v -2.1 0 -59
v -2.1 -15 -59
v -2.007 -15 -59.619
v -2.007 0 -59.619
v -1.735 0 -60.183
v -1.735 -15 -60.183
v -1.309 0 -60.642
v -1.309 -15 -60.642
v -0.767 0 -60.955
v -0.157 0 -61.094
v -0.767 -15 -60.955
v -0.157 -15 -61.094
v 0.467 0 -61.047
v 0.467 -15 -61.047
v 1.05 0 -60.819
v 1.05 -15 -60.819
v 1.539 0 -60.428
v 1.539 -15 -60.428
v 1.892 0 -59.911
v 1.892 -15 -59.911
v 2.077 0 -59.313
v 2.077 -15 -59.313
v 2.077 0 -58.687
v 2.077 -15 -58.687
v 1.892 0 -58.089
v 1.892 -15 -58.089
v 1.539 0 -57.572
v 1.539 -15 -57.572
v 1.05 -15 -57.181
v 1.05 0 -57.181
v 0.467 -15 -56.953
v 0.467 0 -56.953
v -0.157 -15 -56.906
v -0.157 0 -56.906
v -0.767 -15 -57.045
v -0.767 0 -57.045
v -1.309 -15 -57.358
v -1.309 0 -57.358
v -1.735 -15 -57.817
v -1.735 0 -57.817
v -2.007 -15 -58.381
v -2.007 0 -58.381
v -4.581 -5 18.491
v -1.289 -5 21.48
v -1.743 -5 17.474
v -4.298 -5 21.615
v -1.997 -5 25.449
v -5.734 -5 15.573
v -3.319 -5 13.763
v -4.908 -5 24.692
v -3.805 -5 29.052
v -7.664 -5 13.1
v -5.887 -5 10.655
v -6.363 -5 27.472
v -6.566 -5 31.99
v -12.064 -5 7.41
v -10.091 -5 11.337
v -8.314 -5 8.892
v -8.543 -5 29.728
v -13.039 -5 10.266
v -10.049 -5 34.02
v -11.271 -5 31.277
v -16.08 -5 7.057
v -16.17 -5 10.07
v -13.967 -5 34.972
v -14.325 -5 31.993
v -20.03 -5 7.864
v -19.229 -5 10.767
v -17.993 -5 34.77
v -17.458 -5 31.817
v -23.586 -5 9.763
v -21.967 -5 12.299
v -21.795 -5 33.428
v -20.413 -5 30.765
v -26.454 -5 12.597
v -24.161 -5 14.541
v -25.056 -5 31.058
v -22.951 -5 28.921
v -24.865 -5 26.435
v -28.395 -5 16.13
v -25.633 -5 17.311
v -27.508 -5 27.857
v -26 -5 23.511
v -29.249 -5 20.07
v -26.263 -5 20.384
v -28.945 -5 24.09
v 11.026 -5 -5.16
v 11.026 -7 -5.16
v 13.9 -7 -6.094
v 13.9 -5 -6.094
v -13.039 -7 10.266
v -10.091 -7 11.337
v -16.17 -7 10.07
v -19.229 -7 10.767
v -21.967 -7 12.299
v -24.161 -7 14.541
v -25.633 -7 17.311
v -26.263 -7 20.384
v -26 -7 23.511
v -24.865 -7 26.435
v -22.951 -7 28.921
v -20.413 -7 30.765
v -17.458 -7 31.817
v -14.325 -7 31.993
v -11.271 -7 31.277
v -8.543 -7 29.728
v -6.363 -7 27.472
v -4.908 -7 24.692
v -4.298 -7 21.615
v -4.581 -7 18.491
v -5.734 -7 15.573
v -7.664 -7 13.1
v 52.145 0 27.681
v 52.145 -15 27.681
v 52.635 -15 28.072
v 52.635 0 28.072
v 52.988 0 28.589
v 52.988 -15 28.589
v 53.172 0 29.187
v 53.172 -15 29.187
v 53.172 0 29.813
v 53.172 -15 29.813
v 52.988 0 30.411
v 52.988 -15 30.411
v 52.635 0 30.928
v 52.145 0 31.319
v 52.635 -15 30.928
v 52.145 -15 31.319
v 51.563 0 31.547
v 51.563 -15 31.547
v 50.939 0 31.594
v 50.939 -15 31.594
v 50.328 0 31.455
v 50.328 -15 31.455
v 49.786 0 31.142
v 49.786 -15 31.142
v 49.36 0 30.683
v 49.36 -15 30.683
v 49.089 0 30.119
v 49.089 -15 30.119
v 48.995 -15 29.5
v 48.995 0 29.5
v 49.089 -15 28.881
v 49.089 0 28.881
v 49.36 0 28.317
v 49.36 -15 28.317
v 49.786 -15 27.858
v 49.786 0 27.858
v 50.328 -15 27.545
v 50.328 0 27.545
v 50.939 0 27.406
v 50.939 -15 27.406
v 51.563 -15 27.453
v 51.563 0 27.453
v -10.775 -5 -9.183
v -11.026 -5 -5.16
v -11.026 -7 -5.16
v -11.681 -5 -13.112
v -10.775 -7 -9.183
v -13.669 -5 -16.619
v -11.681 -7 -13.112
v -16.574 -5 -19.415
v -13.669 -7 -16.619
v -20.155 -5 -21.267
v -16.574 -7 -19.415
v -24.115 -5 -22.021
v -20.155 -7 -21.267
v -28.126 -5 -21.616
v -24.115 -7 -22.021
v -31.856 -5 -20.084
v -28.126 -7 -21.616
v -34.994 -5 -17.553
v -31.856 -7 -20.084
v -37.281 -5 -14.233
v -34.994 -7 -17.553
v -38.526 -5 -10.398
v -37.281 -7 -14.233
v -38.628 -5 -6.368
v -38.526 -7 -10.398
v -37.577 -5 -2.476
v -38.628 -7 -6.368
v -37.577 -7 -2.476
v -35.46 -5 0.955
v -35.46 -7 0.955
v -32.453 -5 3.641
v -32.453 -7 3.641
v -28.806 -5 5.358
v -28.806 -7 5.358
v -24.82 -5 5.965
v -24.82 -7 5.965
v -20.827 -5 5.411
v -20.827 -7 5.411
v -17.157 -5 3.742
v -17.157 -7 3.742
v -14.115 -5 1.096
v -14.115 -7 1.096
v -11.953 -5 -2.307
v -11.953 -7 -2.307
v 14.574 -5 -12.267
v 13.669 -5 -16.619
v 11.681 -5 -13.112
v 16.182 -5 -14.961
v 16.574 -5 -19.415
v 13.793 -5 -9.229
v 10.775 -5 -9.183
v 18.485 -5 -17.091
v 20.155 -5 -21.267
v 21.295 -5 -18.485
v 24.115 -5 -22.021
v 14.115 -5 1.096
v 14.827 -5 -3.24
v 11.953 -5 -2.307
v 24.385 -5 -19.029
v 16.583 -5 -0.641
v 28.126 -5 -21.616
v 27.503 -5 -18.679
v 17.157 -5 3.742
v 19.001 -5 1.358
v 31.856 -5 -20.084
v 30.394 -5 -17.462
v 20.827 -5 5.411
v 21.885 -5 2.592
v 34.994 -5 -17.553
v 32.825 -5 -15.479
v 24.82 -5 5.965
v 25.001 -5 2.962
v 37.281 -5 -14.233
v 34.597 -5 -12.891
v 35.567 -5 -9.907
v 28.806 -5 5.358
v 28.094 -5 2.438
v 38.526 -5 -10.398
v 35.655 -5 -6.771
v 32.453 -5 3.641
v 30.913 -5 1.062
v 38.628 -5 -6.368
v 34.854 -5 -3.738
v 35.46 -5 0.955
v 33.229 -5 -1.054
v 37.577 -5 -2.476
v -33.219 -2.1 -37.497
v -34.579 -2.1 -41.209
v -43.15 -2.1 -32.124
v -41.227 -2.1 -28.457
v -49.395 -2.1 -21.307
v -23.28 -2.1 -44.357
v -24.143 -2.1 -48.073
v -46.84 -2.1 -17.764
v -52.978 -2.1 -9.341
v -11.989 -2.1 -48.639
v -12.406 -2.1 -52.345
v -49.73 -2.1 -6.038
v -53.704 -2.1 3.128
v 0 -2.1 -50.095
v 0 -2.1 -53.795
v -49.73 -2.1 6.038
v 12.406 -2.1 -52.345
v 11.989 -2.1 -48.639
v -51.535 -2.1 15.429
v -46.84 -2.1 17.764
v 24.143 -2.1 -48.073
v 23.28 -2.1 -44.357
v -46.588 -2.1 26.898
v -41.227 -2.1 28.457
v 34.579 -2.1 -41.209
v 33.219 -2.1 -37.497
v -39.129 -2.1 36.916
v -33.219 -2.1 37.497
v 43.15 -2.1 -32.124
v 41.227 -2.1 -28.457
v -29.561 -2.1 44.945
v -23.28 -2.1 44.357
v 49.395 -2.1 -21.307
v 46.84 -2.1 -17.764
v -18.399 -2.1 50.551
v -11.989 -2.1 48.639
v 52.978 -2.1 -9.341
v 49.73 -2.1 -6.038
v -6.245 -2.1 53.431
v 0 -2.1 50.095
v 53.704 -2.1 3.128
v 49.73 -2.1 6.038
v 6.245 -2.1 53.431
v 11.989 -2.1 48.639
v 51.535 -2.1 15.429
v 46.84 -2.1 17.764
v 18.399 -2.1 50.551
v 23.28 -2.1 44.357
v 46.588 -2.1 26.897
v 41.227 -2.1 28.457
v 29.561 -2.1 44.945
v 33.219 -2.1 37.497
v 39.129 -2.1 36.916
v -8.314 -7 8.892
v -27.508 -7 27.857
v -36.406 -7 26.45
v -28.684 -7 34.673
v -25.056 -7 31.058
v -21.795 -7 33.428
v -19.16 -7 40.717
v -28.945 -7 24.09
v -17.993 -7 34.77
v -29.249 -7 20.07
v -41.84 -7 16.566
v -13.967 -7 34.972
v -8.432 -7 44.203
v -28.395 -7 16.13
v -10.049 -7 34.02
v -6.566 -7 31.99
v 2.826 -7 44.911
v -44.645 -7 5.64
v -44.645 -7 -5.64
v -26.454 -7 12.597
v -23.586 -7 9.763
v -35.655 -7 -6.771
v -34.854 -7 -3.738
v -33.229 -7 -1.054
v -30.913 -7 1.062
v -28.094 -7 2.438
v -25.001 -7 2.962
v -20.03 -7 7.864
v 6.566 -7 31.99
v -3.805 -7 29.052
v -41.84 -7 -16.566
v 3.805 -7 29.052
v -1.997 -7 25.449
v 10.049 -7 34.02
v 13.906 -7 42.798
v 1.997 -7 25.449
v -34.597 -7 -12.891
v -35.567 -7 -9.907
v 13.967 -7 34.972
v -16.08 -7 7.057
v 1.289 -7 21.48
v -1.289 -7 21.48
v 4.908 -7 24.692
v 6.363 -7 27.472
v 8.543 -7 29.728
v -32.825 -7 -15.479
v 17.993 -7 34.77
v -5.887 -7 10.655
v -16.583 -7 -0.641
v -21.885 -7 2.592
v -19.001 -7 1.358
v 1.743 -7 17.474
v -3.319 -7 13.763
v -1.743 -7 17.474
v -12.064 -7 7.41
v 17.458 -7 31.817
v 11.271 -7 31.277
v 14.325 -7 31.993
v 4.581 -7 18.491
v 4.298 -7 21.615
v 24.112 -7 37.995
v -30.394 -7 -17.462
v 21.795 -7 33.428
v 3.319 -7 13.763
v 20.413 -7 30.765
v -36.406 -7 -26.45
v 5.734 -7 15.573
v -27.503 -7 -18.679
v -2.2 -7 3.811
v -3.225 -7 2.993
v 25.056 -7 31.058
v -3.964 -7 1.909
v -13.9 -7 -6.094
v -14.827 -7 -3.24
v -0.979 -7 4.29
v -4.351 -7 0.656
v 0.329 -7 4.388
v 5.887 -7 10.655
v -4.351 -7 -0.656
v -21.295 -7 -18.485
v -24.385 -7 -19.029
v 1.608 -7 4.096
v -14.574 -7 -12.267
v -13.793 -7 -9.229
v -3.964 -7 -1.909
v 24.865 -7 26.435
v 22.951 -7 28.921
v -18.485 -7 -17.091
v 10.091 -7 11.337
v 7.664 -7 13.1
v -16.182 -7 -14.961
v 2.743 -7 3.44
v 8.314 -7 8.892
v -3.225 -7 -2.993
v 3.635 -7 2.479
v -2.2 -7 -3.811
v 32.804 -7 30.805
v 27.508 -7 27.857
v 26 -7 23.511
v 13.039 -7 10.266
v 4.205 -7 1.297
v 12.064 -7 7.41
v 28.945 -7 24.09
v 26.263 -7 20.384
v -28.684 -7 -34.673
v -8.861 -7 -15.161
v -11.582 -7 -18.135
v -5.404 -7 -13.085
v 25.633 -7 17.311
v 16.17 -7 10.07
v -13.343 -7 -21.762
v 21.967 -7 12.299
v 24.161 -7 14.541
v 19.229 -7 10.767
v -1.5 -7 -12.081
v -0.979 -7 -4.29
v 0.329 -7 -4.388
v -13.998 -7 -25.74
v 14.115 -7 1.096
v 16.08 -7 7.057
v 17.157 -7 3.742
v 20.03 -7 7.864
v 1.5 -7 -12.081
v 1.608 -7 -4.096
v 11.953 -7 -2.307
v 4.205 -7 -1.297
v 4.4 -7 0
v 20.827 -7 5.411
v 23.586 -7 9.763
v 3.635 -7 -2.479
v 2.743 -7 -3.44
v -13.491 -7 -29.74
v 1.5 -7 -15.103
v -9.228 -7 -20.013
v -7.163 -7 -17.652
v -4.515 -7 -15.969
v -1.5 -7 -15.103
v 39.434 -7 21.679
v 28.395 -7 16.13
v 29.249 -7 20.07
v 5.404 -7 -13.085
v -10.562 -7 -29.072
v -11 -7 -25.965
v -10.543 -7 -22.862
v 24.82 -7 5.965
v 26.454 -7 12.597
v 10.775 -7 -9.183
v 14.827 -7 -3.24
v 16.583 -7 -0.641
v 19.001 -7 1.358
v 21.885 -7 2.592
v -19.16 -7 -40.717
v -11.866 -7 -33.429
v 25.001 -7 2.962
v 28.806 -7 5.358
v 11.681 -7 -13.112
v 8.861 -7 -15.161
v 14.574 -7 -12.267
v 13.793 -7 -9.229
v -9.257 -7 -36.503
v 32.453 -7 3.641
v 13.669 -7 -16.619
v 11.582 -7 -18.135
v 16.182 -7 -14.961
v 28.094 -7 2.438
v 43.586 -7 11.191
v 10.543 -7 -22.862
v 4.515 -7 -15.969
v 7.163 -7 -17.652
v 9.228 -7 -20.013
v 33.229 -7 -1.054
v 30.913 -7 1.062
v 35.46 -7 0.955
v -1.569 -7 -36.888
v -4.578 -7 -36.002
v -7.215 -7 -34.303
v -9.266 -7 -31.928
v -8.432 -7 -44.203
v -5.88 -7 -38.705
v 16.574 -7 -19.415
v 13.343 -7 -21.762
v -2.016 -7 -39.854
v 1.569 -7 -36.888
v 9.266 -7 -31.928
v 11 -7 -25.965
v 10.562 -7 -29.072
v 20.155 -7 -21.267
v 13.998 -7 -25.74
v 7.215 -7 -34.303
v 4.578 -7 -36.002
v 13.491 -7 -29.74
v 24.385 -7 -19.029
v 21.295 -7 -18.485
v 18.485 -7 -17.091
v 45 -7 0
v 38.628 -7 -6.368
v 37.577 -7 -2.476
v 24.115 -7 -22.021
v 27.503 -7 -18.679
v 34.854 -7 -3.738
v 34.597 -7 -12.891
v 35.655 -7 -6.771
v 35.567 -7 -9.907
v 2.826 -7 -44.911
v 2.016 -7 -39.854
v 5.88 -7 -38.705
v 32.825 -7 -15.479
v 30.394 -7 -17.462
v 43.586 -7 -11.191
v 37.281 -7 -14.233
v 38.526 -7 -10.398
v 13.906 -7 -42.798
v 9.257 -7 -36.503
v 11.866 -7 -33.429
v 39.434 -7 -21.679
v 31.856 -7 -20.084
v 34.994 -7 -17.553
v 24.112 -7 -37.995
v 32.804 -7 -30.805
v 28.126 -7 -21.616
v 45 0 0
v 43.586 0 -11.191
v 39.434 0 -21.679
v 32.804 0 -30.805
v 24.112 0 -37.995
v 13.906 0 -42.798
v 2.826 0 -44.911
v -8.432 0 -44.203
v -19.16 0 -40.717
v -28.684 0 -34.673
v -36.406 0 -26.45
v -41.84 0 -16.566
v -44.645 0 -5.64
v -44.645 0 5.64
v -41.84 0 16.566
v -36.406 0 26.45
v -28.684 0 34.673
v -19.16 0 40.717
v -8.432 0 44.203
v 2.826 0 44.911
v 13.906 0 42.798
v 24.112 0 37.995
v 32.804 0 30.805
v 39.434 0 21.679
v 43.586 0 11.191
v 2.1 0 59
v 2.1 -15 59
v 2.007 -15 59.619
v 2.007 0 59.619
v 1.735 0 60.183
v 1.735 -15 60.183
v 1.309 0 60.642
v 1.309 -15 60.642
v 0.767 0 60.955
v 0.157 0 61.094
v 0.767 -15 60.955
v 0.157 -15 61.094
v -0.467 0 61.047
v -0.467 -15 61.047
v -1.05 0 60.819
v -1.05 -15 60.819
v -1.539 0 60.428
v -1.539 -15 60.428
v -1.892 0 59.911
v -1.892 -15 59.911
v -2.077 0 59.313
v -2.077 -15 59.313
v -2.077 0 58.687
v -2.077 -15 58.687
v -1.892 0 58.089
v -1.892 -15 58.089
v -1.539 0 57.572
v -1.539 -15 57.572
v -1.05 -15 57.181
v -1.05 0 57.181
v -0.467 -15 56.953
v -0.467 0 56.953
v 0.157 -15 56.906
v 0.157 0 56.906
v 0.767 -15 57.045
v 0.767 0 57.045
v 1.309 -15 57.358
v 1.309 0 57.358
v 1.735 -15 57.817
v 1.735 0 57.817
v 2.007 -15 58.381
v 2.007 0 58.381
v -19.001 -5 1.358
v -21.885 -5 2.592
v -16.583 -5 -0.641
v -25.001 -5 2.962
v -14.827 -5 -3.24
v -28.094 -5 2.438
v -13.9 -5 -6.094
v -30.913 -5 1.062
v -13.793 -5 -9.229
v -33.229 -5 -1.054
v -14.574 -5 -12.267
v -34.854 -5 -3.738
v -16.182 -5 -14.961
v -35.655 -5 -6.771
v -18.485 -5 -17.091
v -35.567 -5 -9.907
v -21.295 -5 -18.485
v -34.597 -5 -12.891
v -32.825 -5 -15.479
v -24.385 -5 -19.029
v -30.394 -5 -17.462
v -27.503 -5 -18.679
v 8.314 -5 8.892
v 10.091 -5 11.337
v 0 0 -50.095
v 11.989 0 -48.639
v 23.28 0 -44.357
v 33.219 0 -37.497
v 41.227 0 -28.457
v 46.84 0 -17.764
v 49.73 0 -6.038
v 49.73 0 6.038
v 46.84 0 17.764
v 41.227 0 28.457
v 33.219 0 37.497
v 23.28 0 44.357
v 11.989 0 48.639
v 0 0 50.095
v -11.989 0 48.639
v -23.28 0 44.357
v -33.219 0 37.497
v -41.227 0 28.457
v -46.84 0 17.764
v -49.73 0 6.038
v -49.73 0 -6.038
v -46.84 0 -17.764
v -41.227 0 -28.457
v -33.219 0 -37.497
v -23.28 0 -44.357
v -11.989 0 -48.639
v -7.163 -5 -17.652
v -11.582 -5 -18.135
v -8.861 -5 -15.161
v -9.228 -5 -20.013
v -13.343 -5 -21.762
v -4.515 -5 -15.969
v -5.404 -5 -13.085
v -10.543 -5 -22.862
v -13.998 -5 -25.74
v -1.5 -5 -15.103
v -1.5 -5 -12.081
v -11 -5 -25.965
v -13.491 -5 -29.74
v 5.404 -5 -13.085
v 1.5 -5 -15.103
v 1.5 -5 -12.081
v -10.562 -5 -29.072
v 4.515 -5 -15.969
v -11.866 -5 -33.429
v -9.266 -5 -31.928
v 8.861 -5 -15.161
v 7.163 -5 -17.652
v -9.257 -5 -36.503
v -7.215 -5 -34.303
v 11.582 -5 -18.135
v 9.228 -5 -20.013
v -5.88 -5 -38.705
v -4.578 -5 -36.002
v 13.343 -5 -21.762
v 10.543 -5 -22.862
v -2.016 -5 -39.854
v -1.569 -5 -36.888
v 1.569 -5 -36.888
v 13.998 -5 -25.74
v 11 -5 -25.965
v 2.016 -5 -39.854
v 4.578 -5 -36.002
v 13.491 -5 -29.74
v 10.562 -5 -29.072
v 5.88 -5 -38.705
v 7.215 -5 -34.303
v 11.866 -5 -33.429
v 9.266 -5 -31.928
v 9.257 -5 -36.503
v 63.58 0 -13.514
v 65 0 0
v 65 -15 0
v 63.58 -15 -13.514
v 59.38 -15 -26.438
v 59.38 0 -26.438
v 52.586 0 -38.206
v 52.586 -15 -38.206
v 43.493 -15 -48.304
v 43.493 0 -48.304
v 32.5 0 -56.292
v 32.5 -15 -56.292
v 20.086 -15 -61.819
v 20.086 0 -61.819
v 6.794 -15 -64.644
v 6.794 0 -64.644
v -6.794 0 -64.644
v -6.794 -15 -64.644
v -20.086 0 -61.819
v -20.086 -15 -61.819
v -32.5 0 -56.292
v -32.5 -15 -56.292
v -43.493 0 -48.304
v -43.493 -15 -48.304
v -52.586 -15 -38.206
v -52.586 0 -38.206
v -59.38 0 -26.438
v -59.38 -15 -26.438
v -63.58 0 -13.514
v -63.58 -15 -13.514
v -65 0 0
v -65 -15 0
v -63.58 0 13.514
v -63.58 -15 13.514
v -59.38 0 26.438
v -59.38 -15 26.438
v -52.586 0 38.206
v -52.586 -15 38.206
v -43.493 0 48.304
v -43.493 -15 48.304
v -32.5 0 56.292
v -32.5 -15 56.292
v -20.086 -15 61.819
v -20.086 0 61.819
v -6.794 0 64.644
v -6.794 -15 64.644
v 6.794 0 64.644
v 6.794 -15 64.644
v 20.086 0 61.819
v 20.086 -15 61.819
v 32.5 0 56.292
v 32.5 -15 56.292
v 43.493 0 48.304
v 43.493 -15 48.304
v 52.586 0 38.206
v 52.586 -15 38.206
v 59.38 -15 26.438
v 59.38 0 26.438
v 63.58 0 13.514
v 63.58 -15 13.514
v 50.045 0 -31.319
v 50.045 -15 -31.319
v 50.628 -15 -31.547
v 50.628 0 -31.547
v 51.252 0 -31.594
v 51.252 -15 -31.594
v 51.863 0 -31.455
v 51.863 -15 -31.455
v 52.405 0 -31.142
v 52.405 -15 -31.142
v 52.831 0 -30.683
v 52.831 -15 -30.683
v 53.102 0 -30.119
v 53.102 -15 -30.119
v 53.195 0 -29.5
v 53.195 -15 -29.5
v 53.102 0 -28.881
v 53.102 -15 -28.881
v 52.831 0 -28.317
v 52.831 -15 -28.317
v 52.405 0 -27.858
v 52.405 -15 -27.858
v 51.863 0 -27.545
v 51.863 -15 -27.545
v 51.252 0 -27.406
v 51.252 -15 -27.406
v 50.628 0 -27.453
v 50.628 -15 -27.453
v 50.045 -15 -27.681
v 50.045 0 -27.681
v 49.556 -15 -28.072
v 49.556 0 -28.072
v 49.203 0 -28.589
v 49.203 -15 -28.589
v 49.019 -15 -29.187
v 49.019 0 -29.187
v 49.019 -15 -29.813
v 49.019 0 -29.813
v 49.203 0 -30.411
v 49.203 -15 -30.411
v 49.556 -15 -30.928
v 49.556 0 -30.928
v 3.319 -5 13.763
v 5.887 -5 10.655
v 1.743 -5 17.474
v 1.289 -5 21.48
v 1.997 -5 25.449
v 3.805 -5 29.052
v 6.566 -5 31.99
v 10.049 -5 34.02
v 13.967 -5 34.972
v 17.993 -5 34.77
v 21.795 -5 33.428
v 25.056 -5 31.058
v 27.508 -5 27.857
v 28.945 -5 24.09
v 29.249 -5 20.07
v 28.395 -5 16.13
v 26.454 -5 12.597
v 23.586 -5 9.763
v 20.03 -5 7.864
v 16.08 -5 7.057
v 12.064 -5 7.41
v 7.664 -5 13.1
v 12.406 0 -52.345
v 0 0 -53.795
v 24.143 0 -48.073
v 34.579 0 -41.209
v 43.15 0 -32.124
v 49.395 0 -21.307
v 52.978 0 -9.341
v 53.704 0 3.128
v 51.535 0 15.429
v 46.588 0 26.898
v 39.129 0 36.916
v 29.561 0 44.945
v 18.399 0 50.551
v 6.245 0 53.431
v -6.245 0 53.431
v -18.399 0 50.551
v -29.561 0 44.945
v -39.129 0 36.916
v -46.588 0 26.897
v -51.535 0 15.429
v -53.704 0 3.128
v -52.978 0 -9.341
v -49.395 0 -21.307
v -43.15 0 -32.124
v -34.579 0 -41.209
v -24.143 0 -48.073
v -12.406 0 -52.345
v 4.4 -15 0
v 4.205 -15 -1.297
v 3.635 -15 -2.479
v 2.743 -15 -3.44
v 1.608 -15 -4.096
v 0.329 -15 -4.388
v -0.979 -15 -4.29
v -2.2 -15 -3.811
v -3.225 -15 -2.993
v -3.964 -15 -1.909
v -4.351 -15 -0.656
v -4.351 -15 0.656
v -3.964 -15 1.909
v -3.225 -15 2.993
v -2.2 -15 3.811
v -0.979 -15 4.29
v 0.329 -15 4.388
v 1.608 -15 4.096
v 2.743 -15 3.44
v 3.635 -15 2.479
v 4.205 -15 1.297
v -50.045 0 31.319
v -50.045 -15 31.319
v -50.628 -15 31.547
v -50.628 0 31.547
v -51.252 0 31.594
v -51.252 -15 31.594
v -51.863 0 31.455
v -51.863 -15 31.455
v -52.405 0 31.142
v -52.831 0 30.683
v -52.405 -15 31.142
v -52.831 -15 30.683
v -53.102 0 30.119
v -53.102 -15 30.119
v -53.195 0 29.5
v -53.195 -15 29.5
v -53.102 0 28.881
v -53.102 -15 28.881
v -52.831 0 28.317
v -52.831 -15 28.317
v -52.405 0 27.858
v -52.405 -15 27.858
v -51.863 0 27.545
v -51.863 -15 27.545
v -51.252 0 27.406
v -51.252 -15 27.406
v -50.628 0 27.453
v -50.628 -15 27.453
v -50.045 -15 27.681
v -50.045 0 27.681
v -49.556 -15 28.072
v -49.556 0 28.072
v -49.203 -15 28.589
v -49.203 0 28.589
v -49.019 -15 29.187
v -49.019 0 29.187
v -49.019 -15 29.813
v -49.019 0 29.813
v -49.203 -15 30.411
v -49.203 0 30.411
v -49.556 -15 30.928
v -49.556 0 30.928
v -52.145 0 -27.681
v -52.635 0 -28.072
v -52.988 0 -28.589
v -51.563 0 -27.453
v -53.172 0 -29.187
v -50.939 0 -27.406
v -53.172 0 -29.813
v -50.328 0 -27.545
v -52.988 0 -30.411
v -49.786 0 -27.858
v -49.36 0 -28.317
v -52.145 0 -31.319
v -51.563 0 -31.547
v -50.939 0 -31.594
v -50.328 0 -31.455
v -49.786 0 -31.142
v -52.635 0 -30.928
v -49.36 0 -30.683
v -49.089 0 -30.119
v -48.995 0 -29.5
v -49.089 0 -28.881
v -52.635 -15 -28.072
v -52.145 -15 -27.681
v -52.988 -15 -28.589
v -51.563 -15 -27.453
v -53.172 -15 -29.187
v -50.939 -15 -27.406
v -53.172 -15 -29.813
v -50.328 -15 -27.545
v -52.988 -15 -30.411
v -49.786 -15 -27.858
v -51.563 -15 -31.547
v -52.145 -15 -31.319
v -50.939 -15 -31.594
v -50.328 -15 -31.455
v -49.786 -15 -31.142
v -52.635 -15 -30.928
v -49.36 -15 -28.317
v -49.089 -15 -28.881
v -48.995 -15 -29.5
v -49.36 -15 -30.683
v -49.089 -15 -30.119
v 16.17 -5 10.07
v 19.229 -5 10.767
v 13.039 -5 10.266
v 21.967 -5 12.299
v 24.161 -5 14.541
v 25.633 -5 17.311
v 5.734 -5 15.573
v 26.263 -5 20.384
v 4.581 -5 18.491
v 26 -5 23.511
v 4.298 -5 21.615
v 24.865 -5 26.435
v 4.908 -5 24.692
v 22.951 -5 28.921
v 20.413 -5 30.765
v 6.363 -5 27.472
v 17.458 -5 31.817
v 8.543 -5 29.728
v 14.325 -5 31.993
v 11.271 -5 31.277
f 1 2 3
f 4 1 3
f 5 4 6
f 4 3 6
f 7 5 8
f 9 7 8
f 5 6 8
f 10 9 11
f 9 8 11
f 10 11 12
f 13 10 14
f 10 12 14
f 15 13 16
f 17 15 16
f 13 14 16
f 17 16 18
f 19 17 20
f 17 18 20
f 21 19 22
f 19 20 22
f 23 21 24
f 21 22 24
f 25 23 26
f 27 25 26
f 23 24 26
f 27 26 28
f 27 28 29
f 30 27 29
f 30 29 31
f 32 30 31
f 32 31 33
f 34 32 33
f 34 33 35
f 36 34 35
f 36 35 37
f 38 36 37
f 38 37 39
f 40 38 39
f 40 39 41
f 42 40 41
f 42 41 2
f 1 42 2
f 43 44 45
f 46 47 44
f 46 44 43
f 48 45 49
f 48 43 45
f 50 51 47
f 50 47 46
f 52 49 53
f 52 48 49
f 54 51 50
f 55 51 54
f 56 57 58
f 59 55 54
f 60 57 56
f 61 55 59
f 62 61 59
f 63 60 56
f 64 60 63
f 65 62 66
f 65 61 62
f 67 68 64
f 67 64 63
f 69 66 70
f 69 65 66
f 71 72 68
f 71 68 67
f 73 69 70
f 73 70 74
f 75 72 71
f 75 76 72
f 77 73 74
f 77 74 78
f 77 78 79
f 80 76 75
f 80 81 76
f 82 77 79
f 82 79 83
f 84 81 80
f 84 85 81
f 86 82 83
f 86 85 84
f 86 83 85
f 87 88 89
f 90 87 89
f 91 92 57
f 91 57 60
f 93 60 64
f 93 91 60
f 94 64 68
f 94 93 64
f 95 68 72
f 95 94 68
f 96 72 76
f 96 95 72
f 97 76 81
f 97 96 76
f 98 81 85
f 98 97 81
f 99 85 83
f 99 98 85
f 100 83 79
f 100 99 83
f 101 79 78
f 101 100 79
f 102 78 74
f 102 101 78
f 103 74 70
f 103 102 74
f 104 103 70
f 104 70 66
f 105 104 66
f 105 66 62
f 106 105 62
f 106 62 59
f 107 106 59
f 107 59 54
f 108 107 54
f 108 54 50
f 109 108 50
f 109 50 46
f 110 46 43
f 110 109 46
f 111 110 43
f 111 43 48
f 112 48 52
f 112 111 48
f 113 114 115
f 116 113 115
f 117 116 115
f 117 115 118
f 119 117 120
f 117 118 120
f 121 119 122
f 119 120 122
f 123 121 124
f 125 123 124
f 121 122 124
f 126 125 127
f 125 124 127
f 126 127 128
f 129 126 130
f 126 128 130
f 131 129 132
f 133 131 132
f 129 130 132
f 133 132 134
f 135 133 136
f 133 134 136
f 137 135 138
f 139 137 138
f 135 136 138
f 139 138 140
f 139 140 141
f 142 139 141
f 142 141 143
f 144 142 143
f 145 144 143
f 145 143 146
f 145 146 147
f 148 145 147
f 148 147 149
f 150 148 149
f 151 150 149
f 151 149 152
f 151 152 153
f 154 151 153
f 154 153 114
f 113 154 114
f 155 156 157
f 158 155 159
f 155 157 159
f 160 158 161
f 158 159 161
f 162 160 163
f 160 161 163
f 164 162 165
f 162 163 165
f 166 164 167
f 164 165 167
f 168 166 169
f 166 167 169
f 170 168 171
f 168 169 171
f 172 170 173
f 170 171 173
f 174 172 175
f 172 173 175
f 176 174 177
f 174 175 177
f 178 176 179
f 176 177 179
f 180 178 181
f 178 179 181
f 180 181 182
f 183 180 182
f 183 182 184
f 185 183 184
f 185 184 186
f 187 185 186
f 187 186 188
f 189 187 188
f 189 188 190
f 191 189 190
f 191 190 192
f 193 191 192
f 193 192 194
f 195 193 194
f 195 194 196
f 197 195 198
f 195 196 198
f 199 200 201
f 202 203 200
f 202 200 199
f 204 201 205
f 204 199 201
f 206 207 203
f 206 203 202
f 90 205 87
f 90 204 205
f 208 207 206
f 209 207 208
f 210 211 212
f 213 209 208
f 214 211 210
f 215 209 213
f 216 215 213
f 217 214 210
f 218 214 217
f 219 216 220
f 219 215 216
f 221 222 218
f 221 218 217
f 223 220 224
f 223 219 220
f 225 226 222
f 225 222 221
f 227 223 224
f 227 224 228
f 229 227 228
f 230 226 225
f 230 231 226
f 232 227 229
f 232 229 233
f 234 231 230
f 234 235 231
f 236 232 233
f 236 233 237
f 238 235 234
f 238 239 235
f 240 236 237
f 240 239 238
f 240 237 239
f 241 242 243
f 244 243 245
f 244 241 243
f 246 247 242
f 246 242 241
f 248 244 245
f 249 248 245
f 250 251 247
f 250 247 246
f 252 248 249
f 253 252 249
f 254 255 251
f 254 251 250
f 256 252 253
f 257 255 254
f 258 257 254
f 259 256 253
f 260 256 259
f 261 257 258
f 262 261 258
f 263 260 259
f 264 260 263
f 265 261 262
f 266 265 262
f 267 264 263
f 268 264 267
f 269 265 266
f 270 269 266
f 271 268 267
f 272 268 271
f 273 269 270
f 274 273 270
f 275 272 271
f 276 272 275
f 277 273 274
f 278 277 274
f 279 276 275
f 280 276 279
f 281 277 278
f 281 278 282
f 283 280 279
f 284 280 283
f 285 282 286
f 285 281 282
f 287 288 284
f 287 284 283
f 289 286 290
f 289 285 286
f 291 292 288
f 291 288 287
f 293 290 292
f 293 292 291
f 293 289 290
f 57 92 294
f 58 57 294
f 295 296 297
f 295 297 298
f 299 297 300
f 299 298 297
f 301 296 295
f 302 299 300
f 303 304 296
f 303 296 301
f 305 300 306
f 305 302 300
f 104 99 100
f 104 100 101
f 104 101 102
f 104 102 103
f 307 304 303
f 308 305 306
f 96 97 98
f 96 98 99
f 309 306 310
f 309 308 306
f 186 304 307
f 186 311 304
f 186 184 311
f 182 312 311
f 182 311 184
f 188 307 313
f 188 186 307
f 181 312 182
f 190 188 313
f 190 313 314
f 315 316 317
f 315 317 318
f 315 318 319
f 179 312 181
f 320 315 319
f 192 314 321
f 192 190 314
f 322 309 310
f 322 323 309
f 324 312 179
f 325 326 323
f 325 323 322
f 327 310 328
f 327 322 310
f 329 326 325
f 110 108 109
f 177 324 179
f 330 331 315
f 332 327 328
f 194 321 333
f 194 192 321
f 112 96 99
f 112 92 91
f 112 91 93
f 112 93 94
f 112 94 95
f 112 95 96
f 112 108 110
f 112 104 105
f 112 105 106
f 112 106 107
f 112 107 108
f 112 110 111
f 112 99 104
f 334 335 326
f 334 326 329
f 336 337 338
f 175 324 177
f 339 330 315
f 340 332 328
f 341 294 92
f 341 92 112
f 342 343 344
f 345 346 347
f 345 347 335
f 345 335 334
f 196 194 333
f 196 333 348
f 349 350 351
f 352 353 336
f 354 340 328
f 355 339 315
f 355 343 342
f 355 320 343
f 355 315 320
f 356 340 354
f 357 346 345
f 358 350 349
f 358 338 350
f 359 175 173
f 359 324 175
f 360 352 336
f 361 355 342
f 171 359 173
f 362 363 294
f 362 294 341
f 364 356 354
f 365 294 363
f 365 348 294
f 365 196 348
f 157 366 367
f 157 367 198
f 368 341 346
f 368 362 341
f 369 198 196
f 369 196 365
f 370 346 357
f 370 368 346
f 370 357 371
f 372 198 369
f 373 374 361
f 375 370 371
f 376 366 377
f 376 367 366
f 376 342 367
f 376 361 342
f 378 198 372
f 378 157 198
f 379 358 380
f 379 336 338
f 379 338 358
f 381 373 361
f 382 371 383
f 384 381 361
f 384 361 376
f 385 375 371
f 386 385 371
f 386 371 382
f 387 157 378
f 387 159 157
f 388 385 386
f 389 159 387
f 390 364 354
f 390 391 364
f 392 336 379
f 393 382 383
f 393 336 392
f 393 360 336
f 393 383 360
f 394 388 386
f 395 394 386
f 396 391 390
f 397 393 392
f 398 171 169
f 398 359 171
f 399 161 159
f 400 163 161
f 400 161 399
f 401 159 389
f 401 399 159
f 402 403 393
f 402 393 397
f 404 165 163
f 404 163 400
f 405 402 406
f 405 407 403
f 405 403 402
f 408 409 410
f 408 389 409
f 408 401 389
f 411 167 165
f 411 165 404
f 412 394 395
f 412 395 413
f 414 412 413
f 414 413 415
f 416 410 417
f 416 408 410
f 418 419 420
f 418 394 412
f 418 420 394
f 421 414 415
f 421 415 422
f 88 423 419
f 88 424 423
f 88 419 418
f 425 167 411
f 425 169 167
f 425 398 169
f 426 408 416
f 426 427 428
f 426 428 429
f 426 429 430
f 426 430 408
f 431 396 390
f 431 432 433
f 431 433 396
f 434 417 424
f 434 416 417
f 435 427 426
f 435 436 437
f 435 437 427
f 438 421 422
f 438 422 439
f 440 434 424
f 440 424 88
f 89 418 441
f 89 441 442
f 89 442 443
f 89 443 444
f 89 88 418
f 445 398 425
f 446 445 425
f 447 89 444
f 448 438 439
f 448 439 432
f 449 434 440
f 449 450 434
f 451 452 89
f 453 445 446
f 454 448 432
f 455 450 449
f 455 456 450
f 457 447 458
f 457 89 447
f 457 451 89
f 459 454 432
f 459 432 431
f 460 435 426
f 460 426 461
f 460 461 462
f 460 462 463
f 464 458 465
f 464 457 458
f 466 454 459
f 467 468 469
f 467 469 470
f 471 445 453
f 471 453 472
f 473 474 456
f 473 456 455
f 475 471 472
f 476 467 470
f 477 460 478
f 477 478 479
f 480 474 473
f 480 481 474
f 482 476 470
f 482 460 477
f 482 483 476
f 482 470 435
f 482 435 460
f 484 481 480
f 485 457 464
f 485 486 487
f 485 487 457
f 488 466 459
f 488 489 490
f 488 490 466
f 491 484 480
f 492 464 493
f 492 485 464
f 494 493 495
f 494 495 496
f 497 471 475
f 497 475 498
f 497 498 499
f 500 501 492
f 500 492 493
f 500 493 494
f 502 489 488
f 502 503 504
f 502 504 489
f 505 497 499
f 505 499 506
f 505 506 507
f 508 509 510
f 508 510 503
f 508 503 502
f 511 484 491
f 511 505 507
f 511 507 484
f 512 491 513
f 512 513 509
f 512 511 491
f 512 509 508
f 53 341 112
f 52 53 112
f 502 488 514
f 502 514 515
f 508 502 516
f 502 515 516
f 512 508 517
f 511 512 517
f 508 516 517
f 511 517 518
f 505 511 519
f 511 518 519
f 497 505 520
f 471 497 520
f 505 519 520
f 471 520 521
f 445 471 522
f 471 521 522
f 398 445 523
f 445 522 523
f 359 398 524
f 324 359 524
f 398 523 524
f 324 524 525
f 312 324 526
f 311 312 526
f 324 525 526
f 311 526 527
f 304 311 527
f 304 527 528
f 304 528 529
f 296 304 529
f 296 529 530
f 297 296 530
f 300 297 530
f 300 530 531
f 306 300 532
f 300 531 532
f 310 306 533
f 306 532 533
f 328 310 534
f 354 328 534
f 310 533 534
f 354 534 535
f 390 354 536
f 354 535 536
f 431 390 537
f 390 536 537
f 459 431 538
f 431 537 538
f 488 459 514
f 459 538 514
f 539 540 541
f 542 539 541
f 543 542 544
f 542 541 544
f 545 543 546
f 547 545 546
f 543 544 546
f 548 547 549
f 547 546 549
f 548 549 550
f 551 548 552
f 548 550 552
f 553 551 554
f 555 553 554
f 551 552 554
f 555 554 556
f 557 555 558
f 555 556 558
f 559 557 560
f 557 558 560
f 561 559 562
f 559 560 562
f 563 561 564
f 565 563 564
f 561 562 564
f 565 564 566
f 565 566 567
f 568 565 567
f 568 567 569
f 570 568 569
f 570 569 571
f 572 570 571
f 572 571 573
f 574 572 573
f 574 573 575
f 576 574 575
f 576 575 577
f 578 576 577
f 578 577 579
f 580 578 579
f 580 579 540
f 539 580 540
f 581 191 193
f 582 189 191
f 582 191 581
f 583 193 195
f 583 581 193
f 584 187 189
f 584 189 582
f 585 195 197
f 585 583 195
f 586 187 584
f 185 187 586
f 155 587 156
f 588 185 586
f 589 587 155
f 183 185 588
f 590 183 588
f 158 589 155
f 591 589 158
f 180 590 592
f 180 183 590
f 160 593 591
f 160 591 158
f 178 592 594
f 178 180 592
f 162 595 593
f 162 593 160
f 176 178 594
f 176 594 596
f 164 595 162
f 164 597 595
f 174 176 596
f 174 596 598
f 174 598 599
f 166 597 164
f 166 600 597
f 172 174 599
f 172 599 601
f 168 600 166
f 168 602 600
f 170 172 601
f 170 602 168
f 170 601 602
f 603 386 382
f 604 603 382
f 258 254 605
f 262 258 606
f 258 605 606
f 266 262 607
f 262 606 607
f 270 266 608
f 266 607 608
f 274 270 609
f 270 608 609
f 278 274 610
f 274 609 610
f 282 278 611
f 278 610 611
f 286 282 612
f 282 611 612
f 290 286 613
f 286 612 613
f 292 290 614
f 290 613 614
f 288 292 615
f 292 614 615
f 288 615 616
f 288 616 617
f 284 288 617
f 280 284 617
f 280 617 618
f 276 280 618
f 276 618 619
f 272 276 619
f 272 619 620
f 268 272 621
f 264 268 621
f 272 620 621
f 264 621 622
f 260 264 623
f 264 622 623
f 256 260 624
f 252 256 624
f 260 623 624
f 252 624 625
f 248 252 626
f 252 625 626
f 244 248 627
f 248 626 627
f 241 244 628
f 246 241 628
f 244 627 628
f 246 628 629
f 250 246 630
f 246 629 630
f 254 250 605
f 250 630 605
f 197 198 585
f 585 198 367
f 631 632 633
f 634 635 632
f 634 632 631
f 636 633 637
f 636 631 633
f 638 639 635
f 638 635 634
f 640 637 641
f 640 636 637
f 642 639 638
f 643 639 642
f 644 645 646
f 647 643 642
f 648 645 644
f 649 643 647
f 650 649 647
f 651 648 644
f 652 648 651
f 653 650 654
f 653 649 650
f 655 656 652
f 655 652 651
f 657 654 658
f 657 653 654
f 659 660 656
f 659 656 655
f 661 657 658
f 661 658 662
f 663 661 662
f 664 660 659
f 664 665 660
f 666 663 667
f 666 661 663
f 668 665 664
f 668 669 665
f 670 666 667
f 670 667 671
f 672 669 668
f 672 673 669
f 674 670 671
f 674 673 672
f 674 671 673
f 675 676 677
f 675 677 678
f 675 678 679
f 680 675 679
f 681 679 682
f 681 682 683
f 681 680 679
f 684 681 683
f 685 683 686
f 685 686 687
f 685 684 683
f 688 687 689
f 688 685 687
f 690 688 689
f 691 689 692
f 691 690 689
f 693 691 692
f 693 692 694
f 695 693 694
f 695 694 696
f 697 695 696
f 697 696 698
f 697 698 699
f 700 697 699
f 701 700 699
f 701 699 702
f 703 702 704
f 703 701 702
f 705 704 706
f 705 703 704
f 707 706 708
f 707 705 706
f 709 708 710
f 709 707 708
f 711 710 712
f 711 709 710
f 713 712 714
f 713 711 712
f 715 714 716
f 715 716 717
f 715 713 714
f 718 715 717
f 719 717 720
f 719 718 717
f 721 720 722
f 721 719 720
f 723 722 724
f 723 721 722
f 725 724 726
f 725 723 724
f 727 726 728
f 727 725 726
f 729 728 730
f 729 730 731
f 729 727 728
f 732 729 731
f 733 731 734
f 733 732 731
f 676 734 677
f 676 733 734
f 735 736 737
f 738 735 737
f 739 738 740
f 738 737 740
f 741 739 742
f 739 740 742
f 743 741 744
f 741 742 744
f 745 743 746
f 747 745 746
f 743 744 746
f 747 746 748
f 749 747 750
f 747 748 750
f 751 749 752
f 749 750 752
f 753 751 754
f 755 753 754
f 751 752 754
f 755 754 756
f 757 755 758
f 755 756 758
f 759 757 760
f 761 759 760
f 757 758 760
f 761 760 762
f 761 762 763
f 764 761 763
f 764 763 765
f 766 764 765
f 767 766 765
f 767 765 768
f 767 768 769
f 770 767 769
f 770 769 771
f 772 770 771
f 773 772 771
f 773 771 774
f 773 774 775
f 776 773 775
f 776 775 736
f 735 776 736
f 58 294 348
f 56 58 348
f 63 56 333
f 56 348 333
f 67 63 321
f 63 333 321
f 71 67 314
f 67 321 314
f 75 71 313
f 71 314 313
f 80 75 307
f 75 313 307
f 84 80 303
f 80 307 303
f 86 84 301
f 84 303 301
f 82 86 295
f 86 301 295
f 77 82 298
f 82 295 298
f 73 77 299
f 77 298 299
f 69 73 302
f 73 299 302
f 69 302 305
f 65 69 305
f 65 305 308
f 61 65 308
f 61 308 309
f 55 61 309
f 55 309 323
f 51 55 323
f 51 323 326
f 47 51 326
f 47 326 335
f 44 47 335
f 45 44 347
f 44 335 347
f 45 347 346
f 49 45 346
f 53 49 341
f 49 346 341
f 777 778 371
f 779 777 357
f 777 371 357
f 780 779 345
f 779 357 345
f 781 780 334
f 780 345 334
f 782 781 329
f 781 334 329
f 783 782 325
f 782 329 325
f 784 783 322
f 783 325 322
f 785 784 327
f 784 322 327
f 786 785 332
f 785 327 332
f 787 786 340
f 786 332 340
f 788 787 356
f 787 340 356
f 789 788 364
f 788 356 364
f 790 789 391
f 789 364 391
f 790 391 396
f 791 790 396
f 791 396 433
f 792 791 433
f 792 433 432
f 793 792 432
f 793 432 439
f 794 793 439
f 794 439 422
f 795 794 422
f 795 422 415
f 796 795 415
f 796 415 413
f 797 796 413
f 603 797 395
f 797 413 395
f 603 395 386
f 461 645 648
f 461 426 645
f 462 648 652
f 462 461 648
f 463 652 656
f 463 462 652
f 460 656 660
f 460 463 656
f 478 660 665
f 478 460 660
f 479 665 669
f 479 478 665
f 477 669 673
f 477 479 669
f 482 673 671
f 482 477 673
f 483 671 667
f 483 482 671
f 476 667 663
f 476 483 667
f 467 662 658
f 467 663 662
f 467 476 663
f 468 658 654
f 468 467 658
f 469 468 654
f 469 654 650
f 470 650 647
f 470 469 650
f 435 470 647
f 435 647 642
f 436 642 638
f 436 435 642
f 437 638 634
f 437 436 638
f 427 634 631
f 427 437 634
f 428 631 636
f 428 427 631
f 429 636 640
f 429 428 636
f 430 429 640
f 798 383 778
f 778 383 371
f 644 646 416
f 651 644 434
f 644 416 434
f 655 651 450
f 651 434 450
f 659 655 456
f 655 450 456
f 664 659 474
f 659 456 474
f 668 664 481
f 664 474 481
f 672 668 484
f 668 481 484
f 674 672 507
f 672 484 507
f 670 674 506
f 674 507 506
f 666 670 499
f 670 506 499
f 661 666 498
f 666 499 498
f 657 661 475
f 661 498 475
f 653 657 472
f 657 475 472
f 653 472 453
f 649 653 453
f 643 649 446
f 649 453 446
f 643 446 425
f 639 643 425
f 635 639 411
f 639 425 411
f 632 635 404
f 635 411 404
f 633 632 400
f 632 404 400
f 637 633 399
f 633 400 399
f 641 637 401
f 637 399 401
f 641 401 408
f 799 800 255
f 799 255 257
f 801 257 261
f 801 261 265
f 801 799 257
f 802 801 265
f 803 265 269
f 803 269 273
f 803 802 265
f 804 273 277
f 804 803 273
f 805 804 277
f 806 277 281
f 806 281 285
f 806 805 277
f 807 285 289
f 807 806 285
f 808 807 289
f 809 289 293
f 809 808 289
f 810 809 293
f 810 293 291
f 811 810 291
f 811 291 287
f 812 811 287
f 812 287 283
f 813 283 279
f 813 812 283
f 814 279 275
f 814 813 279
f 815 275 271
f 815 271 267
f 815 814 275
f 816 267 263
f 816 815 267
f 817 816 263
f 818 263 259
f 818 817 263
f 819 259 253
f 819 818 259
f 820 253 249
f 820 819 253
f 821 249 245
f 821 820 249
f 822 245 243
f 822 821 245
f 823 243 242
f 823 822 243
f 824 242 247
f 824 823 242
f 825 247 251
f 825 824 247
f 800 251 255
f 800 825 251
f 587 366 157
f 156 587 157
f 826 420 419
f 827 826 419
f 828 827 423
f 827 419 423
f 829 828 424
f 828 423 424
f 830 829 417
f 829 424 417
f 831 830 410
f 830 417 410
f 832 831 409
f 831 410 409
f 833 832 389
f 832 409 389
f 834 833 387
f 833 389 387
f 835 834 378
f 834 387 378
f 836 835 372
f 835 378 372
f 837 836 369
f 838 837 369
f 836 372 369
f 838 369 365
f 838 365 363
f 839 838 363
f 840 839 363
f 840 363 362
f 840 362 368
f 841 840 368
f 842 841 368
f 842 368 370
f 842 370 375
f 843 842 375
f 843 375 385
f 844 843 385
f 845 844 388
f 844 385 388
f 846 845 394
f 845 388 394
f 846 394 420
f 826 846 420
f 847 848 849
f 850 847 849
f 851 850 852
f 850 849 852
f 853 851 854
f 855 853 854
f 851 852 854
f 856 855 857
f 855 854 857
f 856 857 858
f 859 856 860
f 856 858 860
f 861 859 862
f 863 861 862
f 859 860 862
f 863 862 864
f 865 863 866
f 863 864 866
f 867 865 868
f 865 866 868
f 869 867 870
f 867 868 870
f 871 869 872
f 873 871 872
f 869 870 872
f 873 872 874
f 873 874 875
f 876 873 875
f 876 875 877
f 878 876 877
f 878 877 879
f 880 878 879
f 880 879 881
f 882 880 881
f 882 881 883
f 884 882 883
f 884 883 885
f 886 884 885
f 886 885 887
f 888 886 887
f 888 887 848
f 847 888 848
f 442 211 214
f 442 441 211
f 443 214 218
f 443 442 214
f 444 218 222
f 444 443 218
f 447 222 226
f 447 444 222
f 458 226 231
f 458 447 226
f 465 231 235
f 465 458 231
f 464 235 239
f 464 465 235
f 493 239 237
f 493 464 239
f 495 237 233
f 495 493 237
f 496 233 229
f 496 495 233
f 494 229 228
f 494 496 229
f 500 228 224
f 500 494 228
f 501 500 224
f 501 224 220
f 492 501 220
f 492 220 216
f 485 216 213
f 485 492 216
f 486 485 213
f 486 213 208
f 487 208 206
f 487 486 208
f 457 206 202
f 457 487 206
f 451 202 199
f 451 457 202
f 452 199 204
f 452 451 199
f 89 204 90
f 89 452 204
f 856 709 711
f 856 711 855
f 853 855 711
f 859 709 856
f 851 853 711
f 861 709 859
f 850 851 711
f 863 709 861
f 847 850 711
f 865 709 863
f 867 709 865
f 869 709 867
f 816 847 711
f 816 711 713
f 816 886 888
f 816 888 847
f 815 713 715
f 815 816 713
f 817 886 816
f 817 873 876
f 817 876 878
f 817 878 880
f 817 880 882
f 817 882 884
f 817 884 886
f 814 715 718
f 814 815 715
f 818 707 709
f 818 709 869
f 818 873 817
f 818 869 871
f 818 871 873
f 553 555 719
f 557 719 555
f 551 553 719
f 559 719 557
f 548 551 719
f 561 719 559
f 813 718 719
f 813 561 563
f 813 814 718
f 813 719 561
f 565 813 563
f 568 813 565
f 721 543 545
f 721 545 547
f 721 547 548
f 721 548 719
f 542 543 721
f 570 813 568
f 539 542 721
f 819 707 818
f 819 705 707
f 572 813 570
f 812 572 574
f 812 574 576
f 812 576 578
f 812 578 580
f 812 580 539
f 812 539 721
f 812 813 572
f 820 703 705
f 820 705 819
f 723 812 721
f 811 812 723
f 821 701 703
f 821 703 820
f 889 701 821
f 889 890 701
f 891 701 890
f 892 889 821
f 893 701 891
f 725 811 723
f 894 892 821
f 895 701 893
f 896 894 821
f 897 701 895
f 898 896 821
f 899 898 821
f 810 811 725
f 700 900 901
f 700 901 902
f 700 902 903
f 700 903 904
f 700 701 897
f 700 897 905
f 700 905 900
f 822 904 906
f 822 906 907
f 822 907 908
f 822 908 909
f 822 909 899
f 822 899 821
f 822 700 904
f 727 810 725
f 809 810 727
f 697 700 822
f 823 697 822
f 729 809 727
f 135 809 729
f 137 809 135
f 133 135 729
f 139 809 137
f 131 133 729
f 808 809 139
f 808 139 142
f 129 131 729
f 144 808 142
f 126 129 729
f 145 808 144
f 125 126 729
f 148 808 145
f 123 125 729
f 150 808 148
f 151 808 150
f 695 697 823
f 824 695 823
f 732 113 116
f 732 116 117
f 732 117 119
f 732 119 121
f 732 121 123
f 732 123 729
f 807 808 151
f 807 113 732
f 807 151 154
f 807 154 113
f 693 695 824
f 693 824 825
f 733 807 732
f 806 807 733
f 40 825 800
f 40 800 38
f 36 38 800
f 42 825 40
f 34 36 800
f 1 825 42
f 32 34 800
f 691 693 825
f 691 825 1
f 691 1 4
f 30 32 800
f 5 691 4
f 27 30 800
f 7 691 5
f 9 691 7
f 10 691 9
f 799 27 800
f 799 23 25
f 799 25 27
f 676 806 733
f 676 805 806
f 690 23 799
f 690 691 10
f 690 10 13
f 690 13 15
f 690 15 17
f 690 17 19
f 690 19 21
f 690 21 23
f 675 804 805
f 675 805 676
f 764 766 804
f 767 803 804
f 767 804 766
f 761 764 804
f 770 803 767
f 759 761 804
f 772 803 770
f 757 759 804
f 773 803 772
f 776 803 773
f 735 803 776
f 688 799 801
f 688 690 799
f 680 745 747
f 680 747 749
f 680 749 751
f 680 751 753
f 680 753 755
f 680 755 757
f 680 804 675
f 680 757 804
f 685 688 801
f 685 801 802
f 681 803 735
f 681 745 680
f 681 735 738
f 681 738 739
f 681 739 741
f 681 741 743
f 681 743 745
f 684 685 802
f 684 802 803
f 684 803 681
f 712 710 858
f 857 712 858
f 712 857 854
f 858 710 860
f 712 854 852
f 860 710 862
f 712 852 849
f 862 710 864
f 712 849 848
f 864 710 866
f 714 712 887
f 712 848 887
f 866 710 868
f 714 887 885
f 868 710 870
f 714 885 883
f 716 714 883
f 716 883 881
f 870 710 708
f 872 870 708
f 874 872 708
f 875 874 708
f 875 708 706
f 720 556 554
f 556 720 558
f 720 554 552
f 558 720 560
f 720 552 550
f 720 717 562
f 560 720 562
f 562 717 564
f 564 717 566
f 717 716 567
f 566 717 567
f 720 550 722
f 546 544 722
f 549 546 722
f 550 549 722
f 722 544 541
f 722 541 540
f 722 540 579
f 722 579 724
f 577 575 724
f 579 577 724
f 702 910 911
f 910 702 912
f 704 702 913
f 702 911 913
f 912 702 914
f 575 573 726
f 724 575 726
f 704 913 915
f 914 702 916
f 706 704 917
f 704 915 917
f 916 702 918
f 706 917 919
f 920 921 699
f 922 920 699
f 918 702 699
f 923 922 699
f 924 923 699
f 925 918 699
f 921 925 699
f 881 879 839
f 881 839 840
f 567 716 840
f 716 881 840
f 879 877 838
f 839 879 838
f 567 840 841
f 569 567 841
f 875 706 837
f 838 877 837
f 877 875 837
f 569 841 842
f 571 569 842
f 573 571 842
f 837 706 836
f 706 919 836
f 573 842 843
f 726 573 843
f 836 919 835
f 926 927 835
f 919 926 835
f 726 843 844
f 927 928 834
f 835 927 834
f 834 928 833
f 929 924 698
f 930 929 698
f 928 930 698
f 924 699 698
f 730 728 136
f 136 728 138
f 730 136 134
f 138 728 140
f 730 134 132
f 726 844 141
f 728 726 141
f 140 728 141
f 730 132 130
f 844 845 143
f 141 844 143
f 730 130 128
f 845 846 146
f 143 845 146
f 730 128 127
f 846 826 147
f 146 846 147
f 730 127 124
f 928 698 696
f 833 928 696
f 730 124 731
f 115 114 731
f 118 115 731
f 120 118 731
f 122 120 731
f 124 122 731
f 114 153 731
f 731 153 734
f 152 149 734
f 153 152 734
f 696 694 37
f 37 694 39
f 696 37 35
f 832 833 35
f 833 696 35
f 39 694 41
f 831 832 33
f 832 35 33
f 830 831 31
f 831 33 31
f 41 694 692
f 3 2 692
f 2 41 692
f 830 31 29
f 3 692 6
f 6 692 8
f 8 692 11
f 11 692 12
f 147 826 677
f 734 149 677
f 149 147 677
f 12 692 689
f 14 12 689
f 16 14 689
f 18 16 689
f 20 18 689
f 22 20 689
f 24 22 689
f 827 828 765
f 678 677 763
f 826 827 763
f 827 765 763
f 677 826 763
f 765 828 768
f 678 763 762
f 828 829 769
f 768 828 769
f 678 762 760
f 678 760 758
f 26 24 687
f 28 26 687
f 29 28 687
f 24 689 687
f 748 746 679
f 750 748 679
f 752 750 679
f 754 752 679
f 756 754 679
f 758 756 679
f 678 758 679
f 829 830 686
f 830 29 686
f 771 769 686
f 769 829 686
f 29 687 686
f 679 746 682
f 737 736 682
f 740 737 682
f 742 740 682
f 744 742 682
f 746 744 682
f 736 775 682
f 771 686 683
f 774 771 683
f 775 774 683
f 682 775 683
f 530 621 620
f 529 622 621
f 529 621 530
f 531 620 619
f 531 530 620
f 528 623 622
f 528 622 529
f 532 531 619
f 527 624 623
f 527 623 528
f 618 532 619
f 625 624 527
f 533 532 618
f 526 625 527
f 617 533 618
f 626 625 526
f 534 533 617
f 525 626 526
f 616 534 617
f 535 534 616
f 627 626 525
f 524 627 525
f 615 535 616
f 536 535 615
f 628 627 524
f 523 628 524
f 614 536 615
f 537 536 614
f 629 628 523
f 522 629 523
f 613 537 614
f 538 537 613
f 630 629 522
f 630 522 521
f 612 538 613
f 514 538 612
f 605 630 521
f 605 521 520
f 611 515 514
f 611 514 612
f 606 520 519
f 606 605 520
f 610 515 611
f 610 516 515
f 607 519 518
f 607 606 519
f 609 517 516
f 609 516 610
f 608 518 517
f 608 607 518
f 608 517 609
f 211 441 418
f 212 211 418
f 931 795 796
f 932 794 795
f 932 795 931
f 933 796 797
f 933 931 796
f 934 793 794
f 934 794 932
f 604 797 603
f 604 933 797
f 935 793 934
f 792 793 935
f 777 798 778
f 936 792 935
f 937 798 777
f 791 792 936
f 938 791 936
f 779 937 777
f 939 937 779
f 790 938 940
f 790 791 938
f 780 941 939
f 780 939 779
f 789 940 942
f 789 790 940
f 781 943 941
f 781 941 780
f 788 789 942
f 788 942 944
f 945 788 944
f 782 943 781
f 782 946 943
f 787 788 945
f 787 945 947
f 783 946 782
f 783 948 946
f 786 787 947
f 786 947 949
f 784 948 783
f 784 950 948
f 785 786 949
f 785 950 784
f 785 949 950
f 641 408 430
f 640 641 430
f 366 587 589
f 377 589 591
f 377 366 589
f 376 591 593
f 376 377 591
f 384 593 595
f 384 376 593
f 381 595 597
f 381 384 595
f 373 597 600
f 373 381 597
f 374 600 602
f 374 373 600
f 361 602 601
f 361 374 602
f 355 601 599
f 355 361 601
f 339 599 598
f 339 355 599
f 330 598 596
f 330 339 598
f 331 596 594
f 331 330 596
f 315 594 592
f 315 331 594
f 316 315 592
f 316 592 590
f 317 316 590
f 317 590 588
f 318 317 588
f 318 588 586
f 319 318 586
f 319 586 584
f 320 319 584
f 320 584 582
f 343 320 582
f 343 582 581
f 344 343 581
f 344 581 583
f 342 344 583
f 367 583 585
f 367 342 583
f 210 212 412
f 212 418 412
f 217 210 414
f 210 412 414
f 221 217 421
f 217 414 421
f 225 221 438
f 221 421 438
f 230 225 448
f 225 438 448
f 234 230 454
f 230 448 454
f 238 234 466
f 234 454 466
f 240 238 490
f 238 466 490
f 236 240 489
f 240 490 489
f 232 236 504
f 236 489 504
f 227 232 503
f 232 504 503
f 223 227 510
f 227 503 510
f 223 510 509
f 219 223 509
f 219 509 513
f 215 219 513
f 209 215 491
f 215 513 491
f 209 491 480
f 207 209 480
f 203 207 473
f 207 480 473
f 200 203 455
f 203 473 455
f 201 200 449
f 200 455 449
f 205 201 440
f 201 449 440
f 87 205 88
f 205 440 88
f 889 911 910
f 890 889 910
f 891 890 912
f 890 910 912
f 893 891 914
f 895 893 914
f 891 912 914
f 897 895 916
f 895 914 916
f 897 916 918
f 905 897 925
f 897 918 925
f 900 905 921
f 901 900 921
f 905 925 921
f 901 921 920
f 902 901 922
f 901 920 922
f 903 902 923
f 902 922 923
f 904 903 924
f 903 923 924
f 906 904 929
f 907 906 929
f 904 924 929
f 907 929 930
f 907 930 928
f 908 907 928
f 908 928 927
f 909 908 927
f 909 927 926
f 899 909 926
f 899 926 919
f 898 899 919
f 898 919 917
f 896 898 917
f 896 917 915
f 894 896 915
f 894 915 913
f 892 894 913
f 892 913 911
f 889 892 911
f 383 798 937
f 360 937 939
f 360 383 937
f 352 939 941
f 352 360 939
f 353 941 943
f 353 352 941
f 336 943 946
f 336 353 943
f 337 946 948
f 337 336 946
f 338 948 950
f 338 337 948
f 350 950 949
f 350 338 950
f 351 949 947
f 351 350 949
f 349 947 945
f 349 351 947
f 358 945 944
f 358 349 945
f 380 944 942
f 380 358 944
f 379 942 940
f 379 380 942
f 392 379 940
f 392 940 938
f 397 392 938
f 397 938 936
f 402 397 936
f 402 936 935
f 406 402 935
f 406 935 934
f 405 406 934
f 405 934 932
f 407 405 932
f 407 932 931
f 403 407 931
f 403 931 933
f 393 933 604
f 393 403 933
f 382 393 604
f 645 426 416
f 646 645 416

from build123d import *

# Parameters (mm, degrees)
CROQUIS2_R              = 65
SALIENTE_EXTRUIR1_DEPTH = 15
CROQUIS2_3_R            = 45
CORTAR_EXTRUIR1_DEPTH   = 7
TALADRO_ROSCADO_G1_81_D = 8.8
CROQUIS3_R              = 14
CROQUIS3_R_2            = 11
SALIENTE_EXTRUIR3_DEPTH = 2
CORTAR_EXTRUIR3_DEPTH   = 93.271338995
MATRIZC1_COUNT          = 5
CROQUIS7_W              = 3.7
CROQUIS7_H              = 4.2
TALADRO_ROSCADO_M51_D   = 4.2
MATRIZC2_COUNT          = 6


with BuildPart() as part:
    # Croquis2 → Saliente-Extruir1 (new body)
    with BuildSketch(Plane(origin=(0, 0, 0), x_dir=(1, 0, 0), z_dir=(0, 1, 0))):
        Circle(CROQUIS2_R)
    extrude(amount=-SALIENTE_EXTRUIR1_DEPTH)

    # Croquis2<3> → Cortar-Extruir1 (cut)
    with BuildSketch(Plane(origin=(0, 0, 0), x_dir=(1, 0, 0), z_dir=(0, 1, 0))):
        Circle(CROQUIS2_3_R)
    extrude(amount=-CORTAR_EXTRUIR1_DEPTH, mode=Mode.SUBTRACT)

    # Taladro roscado G1/81 (through all)
    with Locations(Plane(origin=(0, -15, 0), x_dir=(-1, 0, 0), z_dir=(0, -1, 0))):
        with Locations((0, 0)):
            Hole(TALADRO_ROSCADO_G1_81_D / 2)

    # Croquis3 → Saliente-Extruir3 (add)
    with BuildSketch(Plane(origin=(0, -7, 0), x_dir=(1, 0, 0), z_dir=(0, 1, 0))):
        with Locations((0, 26)):
            Circle(CROQUIS3_R)
        with Locations((0, 26)):
            Circle(CROQUIS3_R_2, mode=Mode.SUBTRACT)
    saliente_extruir3 = extrude(amount=SALIENTE_EXTRUIR3_DEPTH)

    # Croquis6 → Cortar-Extruir3 (cut, through all)
    with BuildSketch(Plane(origin=(0, -7, 0), x_dir=(1, 0, 0), z_dir=(0, 1, 0))):
        with BuildLine():
            Line((1.5, 26), (1.5, 4.4))
            ThreePointArc((1.5, 4.4), (0, 2.9), (-1.5, 4.4))
            Line((-1.5, 4.4), (-1.5, 26))
            ThreePointArc((-1.5, 26), (0, 27.5), (1.5, 26))
        make_face()
    cortar_extruir3 = extrude(amount=CORTAR_EXTRUIR3_DEPTH, mode=Mode.SUBTRACT)

    # MatrizC1: Saliente-Extruir3, Cortar-Extruir3 ×5 about axis
    matrizc1_axis = Axis((0, -15, 0), (0, 1, 0))
    add([saliente_extruir3.rotate(matrizc1_axis, i * 360 / MATRIZC1_COUNT) for i in range(1, MATRIZC1_COUNT)])
    add([cortar_extruir3.rotate(matrizc1_axis, i * 360 / MATRIZC1_COUNT) for i in range(1, MATRIZC1_COUNT)], mode=Mode.SUBTRACT)

    # Croquis7 → Cortar-Revolución1 (revolve, cut)
    with BuildSketch(Plane(origin=(0, 0, 0), x_dir=(0, 0, -1), z_dir=(1, 0, 0))):
        with Locations((51.945, 0)):
            Rectangle(CROQUIS7_W, CROQUIS7_H)
    revolve(axis=Axis((0, 0, 0), (0, -1, 0)), mode=Mode.SUBTRACT)

    # Taladro roscado M51 (through all)
    with Locations(Plane(origin=(0, 0, 0), x_dir=(1, 0, 0), z_dir=(0, 1, 0))):
        with Locations((0, 59)):
            taladro_roscado_m51 = Hole(TALADRO_ROSCADO_M51_D / 2)

    # MatrizC2: Taladro roscado M51 ×6 about axis
    matrizc2_axis = Axis((0, -15, 0), (0, 1, 0))
    for i in range(1, MATRIZC2_COUNT):
        add(taladro_roscado_m51.rotate(matrizc2_axis, i * 360 / MATRIZC2_COUNT), mode=Mode.SUBTRACT)


solid = part.part
